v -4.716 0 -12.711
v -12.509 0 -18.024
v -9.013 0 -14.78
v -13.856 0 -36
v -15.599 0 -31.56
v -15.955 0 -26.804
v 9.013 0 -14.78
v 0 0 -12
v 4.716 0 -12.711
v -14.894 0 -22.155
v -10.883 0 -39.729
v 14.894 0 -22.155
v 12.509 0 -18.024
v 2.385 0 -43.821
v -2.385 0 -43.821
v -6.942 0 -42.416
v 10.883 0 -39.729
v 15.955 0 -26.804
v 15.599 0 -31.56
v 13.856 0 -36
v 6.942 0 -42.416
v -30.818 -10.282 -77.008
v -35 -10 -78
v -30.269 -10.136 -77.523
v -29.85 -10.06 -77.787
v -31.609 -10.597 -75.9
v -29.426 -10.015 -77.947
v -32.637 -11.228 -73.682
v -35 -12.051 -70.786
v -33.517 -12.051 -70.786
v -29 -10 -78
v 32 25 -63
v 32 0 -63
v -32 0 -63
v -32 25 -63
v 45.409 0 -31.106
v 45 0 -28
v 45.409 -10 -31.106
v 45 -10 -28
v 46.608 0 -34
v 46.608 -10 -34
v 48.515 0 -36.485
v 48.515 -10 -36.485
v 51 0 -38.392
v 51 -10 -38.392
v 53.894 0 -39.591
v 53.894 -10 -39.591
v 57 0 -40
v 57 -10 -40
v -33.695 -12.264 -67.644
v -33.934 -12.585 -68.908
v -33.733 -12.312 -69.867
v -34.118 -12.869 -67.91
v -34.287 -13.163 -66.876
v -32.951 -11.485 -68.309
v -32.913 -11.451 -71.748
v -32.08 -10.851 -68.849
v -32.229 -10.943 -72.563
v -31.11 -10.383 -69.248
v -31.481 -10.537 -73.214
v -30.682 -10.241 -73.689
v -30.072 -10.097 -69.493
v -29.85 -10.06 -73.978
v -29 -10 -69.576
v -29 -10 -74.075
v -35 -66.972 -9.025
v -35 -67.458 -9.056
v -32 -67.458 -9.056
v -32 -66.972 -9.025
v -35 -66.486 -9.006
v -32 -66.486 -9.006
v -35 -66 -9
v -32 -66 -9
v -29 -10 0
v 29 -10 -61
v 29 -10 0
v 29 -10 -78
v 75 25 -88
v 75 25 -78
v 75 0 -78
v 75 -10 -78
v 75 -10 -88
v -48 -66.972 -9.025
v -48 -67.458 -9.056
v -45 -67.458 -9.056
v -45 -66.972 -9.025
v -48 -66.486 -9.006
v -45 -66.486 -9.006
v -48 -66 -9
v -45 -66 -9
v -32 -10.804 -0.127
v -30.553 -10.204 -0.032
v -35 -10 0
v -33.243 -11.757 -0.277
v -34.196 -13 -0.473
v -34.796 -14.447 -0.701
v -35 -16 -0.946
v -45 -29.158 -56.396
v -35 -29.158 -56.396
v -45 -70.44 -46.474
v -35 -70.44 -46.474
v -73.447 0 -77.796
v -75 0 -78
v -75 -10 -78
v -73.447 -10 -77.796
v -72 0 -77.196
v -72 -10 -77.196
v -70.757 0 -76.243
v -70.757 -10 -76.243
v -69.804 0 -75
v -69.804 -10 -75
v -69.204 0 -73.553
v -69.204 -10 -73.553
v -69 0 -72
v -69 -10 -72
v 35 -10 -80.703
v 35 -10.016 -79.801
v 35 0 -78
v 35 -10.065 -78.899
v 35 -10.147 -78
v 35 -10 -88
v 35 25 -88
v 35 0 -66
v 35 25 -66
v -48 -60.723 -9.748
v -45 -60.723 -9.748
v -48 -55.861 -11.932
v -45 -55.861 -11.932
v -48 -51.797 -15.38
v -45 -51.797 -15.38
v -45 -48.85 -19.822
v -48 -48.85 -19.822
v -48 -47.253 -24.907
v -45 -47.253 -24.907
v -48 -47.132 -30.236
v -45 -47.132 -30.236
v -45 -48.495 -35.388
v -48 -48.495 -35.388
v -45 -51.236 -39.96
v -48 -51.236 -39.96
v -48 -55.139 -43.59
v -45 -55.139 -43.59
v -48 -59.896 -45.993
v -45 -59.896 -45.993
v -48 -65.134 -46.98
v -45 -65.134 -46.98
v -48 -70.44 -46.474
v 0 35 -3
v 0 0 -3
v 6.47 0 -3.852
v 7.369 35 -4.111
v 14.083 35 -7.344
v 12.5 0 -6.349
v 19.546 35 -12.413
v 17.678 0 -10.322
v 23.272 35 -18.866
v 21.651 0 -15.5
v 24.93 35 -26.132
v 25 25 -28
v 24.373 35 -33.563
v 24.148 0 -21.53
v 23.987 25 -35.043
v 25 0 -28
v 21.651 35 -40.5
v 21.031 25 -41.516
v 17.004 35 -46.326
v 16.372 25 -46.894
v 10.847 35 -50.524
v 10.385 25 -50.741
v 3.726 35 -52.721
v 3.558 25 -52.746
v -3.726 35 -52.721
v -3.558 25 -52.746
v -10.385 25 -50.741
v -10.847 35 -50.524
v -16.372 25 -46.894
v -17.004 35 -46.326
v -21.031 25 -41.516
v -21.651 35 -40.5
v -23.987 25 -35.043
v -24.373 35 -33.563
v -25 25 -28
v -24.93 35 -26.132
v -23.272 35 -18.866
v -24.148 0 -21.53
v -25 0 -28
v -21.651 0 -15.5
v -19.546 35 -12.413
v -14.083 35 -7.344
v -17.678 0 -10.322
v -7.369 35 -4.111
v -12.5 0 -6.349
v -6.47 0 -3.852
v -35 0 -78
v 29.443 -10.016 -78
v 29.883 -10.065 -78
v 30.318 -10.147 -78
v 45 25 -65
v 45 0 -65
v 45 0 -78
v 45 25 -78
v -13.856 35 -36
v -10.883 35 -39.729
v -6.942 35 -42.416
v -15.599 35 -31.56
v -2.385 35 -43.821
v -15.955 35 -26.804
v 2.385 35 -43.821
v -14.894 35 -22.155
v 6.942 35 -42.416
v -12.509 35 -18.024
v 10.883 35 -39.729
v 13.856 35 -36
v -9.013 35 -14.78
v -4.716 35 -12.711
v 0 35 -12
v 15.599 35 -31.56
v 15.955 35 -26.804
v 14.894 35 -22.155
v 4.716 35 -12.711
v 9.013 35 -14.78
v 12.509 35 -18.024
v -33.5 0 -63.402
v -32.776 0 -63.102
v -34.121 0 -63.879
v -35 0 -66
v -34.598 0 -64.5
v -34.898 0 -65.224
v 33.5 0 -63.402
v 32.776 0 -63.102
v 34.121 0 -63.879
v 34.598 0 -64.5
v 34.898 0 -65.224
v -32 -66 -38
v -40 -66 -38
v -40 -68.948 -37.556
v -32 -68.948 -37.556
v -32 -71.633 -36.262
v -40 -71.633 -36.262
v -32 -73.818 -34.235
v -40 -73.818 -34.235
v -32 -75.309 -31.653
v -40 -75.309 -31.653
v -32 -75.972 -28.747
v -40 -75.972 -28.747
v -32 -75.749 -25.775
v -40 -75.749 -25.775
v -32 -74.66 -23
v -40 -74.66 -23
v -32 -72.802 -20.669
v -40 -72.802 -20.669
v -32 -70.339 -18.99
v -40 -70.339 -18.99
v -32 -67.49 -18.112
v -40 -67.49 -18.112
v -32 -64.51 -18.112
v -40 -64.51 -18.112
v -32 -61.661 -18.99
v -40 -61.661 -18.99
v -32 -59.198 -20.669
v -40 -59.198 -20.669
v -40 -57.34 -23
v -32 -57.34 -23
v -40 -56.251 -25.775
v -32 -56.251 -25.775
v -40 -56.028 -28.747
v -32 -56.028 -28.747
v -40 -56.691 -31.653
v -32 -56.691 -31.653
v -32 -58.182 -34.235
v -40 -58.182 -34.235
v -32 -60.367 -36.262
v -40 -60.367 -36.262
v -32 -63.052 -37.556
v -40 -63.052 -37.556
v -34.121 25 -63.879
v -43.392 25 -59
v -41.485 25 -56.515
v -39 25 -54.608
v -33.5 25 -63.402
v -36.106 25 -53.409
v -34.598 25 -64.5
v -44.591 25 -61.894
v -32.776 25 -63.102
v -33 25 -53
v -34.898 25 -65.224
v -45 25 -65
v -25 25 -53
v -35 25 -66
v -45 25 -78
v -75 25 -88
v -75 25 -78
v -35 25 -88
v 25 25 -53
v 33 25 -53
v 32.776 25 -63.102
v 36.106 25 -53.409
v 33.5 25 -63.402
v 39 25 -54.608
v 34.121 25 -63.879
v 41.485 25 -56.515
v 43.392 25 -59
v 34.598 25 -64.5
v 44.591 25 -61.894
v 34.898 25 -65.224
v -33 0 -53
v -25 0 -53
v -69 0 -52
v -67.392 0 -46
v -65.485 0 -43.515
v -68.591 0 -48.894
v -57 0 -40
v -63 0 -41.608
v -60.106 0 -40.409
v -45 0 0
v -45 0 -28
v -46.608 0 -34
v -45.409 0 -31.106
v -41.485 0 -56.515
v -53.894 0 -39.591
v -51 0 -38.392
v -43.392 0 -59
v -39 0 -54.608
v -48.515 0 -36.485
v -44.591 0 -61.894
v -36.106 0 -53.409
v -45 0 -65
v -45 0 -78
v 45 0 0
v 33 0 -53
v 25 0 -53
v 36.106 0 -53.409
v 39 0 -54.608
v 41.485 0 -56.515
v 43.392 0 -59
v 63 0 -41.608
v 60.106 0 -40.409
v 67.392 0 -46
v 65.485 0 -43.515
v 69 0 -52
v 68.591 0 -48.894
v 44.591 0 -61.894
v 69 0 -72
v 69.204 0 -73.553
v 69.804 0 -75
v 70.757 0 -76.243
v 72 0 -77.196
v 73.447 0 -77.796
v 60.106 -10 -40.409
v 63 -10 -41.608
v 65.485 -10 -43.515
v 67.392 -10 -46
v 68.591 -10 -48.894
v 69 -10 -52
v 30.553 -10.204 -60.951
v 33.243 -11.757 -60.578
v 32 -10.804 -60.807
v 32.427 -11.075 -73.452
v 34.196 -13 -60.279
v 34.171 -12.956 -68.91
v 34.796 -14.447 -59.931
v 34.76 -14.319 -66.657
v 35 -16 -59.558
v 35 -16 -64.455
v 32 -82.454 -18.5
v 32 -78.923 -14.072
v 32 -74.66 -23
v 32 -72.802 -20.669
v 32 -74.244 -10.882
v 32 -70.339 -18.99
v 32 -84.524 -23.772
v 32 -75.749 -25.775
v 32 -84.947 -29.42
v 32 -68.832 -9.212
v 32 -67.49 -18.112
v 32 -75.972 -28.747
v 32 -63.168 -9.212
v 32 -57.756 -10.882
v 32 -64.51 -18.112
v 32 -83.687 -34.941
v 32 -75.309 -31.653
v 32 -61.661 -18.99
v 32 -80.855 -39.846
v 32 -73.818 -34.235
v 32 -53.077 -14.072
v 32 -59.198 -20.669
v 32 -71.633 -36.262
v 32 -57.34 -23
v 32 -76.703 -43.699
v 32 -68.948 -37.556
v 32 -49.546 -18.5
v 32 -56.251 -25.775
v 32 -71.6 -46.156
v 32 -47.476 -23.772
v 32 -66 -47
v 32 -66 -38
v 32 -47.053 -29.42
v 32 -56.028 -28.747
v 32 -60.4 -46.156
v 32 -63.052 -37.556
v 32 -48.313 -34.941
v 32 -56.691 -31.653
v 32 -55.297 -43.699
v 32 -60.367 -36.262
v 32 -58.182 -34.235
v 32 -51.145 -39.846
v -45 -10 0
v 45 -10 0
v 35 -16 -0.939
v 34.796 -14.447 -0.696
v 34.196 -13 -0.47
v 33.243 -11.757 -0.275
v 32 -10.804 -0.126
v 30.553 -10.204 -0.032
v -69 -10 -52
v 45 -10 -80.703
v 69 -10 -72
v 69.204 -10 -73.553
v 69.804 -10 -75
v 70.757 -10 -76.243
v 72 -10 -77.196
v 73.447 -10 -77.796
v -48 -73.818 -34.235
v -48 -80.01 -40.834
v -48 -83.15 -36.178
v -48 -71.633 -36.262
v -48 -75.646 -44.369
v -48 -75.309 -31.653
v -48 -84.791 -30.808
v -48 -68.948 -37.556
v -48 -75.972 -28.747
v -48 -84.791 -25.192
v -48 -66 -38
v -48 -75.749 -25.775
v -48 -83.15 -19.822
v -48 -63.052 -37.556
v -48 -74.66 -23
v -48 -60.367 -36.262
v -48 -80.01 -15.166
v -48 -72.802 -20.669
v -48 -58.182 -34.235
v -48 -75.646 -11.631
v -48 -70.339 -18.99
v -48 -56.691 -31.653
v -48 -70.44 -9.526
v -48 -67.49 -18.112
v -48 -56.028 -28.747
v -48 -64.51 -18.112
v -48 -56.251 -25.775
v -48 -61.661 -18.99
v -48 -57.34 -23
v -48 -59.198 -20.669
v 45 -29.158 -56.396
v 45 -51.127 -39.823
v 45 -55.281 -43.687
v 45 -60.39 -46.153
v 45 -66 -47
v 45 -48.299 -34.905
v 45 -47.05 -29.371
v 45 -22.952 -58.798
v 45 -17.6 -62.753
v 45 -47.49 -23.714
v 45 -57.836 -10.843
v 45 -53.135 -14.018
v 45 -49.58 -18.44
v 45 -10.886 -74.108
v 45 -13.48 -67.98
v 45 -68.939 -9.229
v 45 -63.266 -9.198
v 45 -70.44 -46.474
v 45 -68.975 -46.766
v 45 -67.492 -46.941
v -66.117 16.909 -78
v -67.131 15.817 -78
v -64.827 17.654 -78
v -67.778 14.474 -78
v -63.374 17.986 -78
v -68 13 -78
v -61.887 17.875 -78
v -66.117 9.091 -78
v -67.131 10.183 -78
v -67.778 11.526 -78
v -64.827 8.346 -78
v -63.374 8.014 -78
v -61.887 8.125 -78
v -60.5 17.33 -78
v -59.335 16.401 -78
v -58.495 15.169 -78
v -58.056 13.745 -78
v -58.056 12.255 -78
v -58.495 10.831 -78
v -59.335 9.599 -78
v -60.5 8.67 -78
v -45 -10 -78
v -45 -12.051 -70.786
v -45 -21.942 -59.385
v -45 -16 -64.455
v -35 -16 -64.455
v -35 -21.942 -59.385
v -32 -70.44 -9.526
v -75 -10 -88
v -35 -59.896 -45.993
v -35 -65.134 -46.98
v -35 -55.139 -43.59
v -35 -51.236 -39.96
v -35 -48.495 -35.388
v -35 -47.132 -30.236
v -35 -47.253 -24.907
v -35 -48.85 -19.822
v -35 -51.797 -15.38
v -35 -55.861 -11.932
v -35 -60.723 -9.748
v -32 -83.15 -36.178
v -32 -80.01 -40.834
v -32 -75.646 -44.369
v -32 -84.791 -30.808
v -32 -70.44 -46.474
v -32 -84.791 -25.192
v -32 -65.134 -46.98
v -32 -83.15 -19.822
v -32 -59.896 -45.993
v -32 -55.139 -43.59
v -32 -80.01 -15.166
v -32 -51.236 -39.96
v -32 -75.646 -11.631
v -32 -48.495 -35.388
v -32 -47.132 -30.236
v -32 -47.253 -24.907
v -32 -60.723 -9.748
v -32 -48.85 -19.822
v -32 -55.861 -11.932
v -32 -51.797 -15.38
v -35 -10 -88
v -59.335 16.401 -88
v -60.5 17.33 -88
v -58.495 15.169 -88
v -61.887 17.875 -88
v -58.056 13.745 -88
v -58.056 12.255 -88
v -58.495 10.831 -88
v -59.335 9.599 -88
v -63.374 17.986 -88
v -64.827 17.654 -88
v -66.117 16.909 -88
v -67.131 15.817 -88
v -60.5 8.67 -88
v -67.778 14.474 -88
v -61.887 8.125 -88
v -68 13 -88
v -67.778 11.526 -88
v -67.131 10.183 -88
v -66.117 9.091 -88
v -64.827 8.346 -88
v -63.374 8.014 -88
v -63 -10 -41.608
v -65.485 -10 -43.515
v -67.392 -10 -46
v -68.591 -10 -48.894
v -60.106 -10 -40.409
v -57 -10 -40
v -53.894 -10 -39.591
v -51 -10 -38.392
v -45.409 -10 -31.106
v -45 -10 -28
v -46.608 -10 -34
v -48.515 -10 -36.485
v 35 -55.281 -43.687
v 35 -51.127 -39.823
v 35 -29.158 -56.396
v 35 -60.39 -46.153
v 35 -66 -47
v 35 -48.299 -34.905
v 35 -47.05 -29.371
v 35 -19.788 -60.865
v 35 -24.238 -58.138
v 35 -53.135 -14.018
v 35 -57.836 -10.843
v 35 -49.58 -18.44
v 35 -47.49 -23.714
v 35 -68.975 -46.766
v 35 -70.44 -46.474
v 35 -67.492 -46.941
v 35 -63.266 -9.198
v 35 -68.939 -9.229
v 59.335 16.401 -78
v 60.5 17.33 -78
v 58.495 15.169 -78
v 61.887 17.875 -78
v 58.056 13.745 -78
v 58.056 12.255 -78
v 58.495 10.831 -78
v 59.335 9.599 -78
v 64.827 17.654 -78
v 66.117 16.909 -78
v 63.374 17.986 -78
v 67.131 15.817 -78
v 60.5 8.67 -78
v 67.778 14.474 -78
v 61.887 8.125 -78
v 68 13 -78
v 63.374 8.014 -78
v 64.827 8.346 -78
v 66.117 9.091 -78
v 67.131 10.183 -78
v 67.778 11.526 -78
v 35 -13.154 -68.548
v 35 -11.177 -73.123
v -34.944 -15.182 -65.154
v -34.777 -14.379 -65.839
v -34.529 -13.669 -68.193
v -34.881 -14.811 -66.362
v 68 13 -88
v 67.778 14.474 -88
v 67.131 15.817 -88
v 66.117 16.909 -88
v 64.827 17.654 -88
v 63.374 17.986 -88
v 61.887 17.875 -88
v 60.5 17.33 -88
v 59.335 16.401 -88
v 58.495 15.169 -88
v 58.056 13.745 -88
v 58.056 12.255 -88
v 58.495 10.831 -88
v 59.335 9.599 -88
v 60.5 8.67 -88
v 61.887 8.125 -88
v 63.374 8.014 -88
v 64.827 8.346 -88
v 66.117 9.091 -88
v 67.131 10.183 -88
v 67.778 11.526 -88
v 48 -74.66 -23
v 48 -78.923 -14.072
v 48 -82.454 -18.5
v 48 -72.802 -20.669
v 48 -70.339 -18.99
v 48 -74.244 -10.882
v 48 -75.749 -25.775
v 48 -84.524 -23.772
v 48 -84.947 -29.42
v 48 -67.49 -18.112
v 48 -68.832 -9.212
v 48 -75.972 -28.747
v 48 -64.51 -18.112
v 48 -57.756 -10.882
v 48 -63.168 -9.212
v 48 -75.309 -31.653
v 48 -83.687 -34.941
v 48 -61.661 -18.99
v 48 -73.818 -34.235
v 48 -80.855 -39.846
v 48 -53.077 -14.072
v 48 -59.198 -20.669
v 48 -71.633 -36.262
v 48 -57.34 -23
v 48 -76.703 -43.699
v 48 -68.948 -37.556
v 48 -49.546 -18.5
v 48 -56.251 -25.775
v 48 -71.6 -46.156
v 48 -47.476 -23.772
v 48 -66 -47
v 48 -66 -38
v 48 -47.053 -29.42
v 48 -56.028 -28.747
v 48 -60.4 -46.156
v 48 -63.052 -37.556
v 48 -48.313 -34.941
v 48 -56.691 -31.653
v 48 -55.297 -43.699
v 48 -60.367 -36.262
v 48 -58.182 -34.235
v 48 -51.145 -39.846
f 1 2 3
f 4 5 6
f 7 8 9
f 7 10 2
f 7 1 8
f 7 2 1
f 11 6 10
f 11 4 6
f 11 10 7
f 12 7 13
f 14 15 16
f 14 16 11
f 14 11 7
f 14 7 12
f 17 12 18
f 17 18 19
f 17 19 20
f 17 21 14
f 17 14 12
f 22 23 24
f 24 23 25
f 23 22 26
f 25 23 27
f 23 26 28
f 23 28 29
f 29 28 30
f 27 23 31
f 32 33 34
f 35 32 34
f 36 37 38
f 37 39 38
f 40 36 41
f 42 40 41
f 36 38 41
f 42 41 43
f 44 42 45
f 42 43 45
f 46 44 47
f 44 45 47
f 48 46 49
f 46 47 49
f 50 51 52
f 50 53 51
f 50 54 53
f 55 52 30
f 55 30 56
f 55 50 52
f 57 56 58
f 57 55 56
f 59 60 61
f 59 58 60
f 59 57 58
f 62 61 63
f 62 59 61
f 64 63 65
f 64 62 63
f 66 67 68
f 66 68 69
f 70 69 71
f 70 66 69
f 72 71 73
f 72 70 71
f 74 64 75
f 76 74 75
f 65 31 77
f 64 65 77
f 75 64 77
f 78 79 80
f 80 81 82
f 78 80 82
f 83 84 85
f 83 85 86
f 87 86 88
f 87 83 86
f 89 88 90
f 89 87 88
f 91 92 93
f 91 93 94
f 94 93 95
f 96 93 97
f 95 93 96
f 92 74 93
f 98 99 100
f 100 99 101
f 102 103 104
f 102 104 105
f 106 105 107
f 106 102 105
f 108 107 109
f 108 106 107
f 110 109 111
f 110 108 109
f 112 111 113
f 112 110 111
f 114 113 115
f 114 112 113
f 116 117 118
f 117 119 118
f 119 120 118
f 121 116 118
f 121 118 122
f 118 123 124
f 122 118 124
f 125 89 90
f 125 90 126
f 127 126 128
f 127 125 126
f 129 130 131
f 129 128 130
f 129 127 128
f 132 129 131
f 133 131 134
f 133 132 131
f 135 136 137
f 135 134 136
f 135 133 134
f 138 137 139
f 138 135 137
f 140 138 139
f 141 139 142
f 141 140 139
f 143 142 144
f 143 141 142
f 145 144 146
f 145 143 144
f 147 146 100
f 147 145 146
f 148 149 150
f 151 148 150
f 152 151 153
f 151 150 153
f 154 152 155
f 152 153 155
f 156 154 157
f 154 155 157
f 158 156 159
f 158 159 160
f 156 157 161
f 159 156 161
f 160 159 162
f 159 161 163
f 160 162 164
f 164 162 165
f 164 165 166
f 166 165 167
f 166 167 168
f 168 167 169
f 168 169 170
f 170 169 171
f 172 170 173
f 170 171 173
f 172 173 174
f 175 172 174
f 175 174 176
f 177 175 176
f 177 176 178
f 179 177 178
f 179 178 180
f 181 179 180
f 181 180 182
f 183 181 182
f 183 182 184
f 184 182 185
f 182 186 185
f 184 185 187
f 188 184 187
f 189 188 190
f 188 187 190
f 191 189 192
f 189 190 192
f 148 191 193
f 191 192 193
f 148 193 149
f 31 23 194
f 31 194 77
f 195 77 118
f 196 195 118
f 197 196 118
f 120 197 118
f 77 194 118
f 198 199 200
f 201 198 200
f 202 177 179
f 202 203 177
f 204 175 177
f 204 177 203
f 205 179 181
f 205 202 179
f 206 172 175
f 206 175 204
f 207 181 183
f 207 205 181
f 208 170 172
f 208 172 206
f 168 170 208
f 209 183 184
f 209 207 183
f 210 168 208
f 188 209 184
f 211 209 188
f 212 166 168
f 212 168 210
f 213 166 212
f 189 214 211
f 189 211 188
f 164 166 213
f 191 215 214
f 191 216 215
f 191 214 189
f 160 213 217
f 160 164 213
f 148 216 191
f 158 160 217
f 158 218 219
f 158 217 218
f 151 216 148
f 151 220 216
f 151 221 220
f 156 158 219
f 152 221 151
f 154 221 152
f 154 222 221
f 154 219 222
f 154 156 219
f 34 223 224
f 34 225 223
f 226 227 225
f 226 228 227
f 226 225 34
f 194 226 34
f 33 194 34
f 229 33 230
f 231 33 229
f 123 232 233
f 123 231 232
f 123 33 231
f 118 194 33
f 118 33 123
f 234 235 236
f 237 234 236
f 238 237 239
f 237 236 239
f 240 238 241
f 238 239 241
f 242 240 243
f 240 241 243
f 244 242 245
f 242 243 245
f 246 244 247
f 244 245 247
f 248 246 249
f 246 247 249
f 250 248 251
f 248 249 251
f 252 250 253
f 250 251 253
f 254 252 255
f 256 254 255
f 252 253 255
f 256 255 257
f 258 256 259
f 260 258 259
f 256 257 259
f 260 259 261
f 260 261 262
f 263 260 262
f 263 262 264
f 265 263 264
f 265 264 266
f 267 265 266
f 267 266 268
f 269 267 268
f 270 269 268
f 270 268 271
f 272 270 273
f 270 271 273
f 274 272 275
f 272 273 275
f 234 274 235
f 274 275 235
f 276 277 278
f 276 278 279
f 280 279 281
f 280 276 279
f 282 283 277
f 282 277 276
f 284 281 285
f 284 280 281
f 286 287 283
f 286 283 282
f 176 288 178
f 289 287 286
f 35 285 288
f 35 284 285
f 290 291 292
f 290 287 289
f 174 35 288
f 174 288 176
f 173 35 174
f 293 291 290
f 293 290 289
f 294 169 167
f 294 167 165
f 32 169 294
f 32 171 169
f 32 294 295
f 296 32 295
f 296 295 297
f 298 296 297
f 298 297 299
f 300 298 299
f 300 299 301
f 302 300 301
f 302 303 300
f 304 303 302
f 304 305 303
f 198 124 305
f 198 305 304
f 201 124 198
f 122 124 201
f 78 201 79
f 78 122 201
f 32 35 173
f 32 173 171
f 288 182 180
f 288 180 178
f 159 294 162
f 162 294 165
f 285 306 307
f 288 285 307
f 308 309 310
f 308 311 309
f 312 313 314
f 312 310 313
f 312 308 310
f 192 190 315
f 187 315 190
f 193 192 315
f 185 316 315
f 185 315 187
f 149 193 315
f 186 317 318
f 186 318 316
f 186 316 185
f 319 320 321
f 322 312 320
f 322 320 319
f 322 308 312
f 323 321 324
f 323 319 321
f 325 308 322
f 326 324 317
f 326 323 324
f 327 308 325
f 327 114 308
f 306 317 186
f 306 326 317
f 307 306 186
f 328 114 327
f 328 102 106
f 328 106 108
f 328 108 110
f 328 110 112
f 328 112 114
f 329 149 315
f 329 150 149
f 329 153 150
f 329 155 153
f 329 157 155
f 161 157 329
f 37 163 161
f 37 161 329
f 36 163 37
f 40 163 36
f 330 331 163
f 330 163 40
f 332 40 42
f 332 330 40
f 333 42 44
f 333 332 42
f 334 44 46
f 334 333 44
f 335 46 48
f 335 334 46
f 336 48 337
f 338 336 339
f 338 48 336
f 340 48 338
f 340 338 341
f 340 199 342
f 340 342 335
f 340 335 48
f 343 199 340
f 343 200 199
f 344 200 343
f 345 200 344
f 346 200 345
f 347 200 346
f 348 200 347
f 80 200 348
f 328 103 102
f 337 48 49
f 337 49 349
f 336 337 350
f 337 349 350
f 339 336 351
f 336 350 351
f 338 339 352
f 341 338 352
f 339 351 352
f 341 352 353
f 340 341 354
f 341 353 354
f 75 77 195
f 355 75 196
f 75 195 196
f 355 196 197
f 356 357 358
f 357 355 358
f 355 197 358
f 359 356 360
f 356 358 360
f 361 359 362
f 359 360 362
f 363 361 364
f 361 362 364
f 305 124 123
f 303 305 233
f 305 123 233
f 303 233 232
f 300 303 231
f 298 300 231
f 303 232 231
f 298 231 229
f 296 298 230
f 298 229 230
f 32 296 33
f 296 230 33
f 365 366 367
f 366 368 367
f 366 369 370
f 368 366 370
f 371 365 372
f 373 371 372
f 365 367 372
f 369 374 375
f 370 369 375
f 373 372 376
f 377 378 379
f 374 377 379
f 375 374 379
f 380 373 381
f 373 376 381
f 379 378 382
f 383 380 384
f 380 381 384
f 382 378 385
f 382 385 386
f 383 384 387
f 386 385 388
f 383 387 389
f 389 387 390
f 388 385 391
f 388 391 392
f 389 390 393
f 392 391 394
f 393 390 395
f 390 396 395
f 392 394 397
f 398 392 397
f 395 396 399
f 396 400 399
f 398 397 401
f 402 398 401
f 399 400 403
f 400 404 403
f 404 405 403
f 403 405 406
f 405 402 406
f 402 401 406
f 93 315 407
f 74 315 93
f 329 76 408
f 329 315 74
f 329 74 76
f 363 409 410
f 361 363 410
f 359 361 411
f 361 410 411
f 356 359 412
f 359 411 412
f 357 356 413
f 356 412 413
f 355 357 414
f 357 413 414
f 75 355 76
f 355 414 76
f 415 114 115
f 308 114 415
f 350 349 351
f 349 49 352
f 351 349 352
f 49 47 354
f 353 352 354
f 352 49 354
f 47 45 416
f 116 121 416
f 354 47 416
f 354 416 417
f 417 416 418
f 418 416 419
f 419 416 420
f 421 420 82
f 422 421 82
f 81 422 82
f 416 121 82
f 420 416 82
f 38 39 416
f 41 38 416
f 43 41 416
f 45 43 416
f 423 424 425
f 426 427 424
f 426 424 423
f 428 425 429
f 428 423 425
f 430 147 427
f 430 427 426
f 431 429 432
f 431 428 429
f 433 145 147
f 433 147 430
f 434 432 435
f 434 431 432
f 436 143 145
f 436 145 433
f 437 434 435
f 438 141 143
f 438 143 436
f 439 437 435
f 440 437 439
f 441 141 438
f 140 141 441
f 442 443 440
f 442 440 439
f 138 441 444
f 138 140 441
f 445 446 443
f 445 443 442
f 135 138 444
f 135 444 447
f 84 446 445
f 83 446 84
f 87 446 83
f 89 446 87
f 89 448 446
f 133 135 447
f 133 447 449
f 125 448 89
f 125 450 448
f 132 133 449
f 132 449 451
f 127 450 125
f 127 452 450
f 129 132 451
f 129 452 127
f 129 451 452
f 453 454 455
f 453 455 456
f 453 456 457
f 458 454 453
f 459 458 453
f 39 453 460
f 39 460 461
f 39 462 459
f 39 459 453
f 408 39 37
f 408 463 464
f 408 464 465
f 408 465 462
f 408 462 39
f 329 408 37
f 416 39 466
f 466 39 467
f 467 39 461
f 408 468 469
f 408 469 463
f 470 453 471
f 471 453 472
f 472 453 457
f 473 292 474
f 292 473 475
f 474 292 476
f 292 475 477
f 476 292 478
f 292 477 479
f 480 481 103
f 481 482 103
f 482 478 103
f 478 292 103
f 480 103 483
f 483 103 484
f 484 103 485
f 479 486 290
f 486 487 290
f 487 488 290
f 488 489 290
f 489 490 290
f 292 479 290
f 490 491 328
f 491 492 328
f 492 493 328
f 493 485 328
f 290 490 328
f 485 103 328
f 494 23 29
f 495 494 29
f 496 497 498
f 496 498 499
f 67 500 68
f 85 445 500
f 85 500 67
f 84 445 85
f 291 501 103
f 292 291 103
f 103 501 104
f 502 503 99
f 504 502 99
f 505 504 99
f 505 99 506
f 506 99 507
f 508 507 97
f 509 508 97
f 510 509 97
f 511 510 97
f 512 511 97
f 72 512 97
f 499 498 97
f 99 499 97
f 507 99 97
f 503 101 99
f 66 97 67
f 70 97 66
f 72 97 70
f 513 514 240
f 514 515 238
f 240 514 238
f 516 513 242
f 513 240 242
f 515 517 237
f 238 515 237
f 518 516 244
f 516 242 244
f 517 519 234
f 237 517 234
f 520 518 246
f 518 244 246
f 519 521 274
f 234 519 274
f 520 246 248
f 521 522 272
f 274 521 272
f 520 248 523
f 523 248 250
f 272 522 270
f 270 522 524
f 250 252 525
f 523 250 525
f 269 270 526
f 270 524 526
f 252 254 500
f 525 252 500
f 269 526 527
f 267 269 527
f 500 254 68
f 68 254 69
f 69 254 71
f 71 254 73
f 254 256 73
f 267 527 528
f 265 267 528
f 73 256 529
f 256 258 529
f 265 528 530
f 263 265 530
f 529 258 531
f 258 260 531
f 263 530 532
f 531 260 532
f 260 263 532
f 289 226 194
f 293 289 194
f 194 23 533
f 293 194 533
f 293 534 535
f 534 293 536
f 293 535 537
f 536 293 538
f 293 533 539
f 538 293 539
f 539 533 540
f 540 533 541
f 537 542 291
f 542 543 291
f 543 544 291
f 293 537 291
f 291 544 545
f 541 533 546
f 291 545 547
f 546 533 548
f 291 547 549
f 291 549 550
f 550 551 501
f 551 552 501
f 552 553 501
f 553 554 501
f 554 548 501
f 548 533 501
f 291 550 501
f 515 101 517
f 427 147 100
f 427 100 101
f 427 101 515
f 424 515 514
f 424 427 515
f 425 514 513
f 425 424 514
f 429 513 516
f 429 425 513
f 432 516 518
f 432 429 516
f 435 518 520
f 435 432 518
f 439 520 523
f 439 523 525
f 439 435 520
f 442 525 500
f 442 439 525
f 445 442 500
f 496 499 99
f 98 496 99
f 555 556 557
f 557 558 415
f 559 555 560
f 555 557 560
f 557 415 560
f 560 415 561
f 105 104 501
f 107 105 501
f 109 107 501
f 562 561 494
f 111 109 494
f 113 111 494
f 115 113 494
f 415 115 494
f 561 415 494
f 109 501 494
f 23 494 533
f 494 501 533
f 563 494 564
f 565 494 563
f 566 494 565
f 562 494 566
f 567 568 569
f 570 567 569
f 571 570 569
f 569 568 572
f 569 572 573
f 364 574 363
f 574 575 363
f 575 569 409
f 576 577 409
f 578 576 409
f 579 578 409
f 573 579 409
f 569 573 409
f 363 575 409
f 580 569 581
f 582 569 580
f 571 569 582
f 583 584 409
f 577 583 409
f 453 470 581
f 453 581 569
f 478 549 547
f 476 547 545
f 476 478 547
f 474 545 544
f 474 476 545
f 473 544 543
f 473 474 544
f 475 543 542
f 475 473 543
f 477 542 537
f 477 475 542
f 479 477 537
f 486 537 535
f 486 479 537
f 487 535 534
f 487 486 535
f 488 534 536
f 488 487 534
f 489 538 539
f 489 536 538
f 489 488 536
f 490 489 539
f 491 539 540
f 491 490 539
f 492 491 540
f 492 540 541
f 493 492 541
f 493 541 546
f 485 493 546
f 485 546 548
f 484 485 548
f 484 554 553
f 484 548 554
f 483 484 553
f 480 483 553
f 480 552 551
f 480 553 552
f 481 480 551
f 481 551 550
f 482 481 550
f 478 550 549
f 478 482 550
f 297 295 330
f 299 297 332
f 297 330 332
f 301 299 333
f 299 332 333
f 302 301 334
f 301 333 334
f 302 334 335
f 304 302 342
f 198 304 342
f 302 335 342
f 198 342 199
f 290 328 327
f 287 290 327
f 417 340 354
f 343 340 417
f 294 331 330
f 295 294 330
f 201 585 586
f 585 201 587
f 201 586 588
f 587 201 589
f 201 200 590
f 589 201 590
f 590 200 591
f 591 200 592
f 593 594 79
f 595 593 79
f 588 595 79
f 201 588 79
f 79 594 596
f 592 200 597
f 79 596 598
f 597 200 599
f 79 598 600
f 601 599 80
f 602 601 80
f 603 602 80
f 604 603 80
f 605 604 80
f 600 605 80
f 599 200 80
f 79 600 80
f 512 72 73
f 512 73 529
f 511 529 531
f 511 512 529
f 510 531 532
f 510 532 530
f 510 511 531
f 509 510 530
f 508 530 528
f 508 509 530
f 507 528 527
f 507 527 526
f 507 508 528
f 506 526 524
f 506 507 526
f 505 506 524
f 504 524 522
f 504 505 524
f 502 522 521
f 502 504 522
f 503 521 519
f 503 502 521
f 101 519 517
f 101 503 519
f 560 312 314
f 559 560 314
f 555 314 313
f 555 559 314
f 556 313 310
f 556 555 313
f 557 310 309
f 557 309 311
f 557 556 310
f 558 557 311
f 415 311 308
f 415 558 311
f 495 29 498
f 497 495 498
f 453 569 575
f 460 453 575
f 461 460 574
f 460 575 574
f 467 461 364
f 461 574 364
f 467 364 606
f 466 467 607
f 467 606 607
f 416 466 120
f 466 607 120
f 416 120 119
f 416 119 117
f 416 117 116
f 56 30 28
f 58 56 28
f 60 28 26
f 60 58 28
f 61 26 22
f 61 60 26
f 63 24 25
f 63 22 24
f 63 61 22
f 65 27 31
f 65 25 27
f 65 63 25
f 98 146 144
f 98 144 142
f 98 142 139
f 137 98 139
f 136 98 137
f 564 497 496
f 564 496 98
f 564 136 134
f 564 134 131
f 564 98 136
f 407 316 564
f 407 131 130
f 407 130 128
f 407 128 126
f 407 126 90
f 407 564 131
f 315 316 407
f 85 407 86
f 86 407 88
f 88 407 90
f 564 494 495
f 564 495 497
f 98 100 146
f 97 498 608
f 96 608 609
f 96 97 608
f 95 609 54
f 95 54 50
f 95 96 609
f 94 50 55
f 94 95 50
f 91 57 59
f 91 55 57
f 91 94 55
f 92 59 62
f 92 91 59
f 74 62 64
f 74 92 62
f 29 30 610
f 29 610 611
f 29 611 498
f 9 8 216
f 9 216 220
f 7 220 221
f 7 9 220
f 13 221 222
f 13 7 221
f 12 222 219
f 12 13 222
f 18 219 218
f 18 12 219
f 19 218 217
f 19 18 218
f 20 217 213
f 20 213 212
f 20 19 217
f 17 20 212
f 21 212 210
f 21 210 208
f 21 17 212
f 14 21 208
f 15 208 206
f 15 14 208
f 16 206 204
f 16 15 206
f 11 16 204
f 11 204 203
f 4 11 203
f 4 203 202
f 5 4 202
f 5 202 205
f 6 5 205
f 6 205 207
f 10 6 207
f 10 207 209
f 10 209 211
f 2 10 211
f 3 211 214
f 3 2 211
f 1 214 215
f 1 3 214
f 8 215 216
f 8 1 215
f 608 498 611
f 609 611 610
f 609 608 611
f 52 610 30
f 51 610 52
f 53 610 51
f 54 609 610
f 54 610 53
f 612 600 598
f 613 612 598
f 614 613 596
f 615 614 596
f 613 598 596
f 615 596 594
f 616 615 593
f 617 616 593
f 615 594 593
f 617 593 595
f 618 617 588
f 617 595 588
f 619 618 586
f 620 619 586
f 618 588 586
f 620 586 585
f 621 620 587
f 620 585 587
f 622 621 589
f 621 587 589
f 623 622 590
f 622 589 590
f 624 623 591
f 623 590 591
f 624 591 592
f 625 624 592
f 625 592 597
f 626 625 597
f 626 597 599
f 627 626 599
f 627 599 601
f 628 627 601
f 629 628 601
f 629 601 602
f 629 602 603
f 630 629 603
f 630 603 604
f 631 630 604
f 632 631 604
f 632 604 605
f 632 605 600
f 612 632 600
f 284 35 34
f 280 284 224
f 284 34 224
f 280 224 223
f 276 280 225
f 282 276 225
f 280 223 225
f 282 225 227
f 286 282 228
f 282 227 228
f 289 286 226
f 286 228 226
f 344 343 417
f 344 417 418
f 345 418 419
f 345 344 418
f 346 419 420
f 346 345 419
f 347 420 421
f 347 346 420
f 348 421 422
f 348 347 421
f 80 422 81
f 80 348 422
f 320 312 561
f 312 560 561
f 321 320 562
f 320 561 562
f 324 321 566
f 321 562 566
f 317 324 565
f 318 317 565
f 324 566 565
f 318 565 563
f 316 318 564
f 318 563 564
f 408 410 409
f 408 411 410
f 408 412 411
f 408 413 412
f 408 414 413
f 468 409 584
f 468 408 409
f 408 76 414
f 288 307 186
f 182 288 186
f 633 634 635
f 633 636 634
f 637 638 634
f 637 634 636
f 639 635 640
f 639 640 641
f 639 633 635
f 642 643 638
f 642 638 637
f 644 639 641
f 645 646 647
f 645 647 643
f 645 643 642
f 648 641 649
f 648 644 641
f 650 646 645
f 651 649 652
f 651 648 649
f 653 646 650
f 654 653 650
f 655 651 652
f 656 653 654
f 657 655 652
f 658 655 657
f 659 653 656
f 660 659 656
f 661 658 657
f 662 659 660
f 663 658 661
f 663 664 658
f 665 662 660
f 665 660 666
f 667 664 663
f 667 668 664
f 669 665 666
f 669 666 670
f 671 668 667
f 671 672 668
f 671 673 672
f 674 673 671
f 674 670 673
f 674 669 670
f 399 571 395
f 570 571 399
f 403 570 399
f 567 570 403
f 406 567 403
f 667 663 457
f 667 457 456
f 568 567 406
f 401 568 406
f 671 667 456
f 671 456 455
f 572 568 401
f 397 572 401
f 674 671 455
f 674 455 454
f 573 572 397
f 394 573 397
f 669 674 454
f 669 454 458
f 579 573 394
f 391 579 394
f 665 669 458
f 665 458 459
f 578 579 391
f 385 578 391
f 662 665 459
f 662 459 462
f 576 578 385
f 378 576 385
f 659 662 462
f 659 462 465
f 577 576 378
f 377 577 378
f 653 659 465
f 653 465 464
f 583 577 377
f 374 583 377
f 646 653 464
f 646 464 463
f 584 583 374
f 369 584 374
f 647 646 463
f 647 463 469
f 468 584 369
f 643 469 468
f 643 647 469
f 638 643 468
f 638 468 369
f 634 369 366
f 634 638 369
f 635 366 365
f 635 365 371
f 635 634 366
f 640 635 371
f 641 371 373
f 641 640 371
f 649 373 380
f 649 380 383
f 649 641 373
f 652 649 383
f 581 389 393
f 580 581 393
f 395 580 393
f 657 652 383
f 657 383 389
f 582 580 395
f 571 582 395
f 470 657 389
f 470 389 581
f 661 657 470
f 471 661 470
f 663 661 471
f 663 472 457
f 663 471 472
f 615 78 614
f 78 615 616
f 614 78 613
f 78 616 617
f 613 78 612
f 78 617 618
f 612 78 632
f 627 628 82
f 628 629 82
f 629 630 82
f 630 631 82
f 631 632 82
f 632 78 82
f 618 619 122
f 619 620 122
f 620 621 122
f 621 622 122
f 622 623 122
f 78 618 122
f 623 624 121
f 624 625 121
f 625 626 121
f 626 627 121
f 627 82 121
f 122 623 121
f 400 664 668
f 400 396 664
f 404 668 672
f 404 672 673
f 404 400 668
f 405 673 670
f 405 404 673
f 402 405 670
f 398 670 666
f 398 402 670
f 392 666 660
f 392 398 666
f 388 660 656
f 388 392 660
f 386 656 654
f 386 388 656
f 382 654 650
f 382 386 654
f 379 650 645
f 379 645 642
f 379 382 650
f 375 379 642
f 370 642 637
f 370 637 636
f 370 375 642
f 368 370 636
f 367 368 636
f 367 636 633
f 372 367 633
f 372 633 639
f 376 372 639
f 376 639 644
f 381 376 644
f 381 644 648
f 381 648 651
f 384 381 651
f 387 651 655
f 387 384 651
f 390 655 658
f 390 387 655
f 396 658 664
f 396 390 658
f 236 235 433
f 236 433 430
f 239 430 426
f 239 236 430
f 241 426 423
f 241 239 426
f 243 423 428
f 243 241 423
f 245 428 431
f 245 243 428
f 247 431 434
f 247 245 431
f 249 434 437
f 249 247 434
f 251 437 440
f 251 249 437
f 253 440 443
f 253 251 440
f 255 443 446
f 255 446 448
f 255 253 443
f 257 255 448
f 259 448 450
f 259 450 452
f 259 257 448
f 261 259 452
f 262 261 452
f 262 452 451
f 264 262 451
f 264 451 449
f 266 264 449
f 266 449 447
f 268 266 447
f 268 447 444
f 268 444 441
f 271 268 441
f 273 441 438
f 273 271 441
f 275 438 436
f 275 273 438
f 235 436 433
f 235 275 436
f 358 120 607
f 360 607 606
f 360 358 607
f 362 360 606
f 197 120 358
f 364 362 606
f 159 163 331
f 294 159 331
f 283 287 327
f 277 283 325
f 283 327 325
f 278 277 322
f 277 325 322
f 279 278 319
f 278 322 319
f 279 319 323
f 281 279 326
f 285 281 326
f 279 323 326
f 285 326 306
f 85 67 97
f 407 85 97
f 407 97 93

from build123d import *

# Parameters (mm, degrees)
BOSS_EXTRUDE1_DEPTH = 10
SKETCH2_R           = 25
SKETCH2_R_2         = 16
BOSS_EXTRUDE2_DEPTH = 35
BOSS_EXTRUDE4_START = -45
BOSS_EXTRUDE4_DEPTH = 35
SKETCH4_R           = 5
CUT_EXTRUDE1_DEPTH  = 35
FILLET1_R           = 12
FILLET2_R           = 12
BOSS_EXTRUDE5_START = -5
SKETCH5_R           = 19
SKETCH5_R_2         = 10
BOSS_EXTRUDE5_DEPTH = 8
BOSS_EXTRUDE6_DEPTH = 10
FILLET3_R           = 6
FILLET4_START       = 35
FILLET4_DEPTH       = 10
FILLET4_START_2     = -78
FILLET4_2_DEPTH     = 21.60438079
FILLET4_START_3     = 30.318225383
FILLET4_3_DEPTH     = 4.681774617
BOSS_EXTRUDE7_START = -5
SKETCH7_R           = 10
BOSS_EXTRUDE7_DEPTH = 8
BOSS_EXTRUDE8_START = -10
BOSS_EXTRUDE8_DEPTH = 10
FILLET5_R           = 6


with BuildPart() as part:
    # Sketch1 → Boss-Extrude1 (new body)
    with BuildSketch(Plane(origin=(0, 0, 0), x_dir=(1, 0, 0), z_dir=(0, 1, 0))):
        with BuildLine():
            Line((-45, 0), (45, 0))
            Line((45, 0), (45, 40))
            Line((45, 40), (69, 40))
            Line((69, 40), (69, 72))
            ThreePointArc((69, 72), (70.757359313, 76.242640687), (75, 78))
            Line((75, 78), (-75, 78))
            ThreePointArc((-75, 78), (-70.757359313, 76.242640687), (-69, 72))
            Line((-69, 72), (-69, 40))
            Line((-69, 40), (-45, 40))
            Line((-45, 40), (-45, 0))
        make_face()
    extrude(amount=-BOSS_EXTRUDE1_DEPTH)

    # Sketch2 → Boss-Extrude2 (add)
    with BuildSketch(Plane(origin=(0, 0, 0), x_dir=(1, 0, 0), z_dir=(0, 1, 0))):
        with Locations(Location((0, 28, 0), (0, 0, 270))):
            Circle(SKETCH2_R)
        with Locations(Location((0, 28, 0), (0, 0, 270))):
            Circle(SKETCH2_R_2, mode=Mode.SUBTRACT)
    extrude(amount=BOSS_EXTRUDE2_DEPTH)

    # Sketch3 → Boss-Extrude4 (add)
    with BuildSketch(Plane(origin=(0, 35, 0), x_dir=(1, 0, 0), z_dir=(0, 1, 0)).offset(BOSS_EXTRUDE4_START)):
        with BuildLine():
            Line((32, 63), (-32, 63))
            ThreePointArc((-32, 63), (-34.121320344, 63.878679656), (-35, 66))
            Line((-35, 66), (-35, 88))
            Line((-35, 88), (-75, 88))
            Line((-75, 88), (-75, 78))
            Line((-75, 78), (-45, 78))
            Line((-45, 78), (-45, 65))
            ThreePointArc((-45, 65), (-41.485281374, 56.514718626), (-33, 53))
            Line((-33, 53), (-25, 53))
            Line((-25, 53), (-25, 28))
            ThreePointArc((-25, 28), (0, 53), (25, 28))
            Line((25, 28), (25, 53))
            Line((25, 53), (33, 53))
            ThreePointArc((33, 53), (41.485281374, 56.514718626), (45, 65))
            Line((45, 65), (45, 78))
            Line((45, 78), (75, 78))
            Line((75, 78), (75, 88))
            Line((75, 88), (35, 88))
            Line((35, 88), (35, 66))
            ThreePointArc((35, 66), (34.121320344, 63.878679656), (32, 63))
        make_face()
    extrude(amount=BOSS_EXTRUDE4_DEPTH)

    # Sketch4 → Cut-Extrude1 (cut)
    with BuildSketch(Plane.XY.offset(-78)):
        with Locations((63, 13)):
            Circle(SKETCH4_R)
    cut_extrude1 = extrude(amount=-CUT_EXTRUDE1_DEPTH, mode=Mode.SUBTRACT)

    # Mirror1: Cut-Extrude1 across plane
    add(cut_extrude1.mirror(Plane(origin=(0, 0, 0), x_dir=(0, 0, 1), z_dir=(1, 0, 0))), mode=Mode.SUBTRACT)

    # Fillet1
    fillet1_edges = [part.edges().sort_by_distance(p)[0] for p in [
        (-45, -5, -40),
        (45, -5, -40),
    ]]
    fillet(fillet1_edges, radius=FILLET1_R)

    # Fillet2
    fillet2_edges = [part.edges().sort_by_distance(p)[0] for p in [
        (-69, -5, -40),
        (69, -5, -40),
    ]]
    fillet(fillet2_edges, radius=FILLET2_R - 0.0001)  # a hair under: the kernel refuses the full size



with BuildPart() as body_2:
    # Sketch5 → Boss-Extrude5 (new, symmetric)
    with BuildSketch(Plane(origin=(45, 0, 0), x_dir=(0, 0, -1), z_dir=(1, 0, 0)).offset(BOSS_EXTRUDE5_START)):
        with Locations((28, -66)):
            Circle(SKETCH5_R)
        with Locations((28, -66)):
            Circle(SKETCH5_R_2, mode=Mode.SUBTRACT)
    extrude(amount=BOSS_EXTRUDE5_DEPTH, both=True)


with BuildPart() as part_1:
    add(part.part)

    add(body_2.part)  # Boss-Extrude6 merges body 2
    # Sketch5<3> → Boss-Extrude6 (add)
    with BuildSketch(Plane(origin=(45, 0, 0), x_dir=(0, 0, -1), z_dir=(1, 0, 0))):
        with BuildLine():
            Line((61, -10), (0, -10))
            Line((0, -10), (9.228717941, -68.939212458))
            ThreePointArc((9.228717941, -68.939212458), (26.525951004, -47.057265785), (47, -66))
            ThreePointArc((47, -66), (46.868026287, -68.235527685), (46.473938523, -70.439999487))
            Line((46.473938523, -70.439999487), (61, -10))
        make_face()
    extrude(amount=-BOSS_EXTRUDE6_DEPTH)

    # Fillet3
    fillet3_edges = [part_1.edges().sort_by_distance(p)[0] for p in [
        (35, -10, -30.5),
    ]]
    fillet(fillet3_edges, radius=FILLET3_R)

    # Fillet4: read off the stored shape, not the designer's step
    # Fillet4 outline → Fillet4 (add)
    with BuildSketch(Plane.YZ.offset(FILLET4_START)):
        with BuildLine():
            ThreePointArc((-29.157895412, -56.39561931), (-15.365176157, -65.228495591), (-10, -80.703433157))
            Line((-10, -80.703433157), (-10, -61))
            Line((-10, -61), (-29.157895412, -56.39561931))
        make_face()
    extrude(amount=FILLET4_DEPTH)

    # Fillet4 2 outline → Fillet4 2 (add)
    with BuildSketch(Plane.XY.offset(FILLET4_START_2)):
        with BuildLine():
            ThreePointArc((29, -10), (33.242640687, -11.757359313), (35, -16))
            Line((35, -16), (35, -10))
            Line((35, -10), (29, -10))
        make_face()
    extrude(amount=FILLET4_2_DEPTH)

    # Fillet4 3 outline → Fillet4 3 (cut)
    with BuildSketch(Plane.YZ.offset(FILLET4_START_3)):
        with BuildLine():
            Line((-18, -80), (-10.009898324, -80))
            ThreePointArc((-10.009898324, -80), (-12.047126523, -70.795577731), (-17.3481317, -63))
            Line((-17.3481317, -63), (-18, -63))
            Line((-18, -63), (-18, -80))
        make_face()
    extrude(amount=FILLET4_3_DEPTH, mode=Mode.SUBTRACT)



with BuildPart() as body_2_2:
    # Sketch7 → Boss-Extrude7 (new, symmetric)
    with BuildSketch(Plane.ZY.offset(45).offset(BOSS_EXTRUDE7_START)):
        with BuildLine():
            ThreePointArc((-46.473938523, -70.439999487), (-28, -85), (-9.526061477, -70.439999487))
            Line((-9.526061477, -70.439999487), (-9.055986357, -67.457514009))
            ThreePointArc((-9.055986357, -67.457514009), (-9.014001748, -66.729294447), (-9, -66))
            ThreePointArc((-9, -66), (-30.235527685, -47.131973713), (-46.473938523, -70.439999487))
        make_face()
        with Locations(Location((-28, -66, 0), (0, 0, 180))):
            Circle(SKETCH7_R, mode=Mode.SUBTRACT)
    extrude(amount=BOSS_EXTRUDE7_DEPTH, both=True)


with BuildPart() as part_2:
    add(part_1.part)

    add(body_2_2.part)  # Boss-Extrude8 merges body 2 2
    # Sketch7<3> → Boss-Extrude8 (add)
    with BuildSketch(Plane.ZY.offset(45).offset(BOSS_EXTRUDE8_START)):
        with BuildLine():
            ThreePointArc((-9, -66), (-9.014001748, -66.729294447), (-9.055986357, -67.457514009))
            Line((-9.055986357, -67.457514009), (0, -10))
            Line((0, -10), (-28, -10))
            Line((-28, -10), (-78, -10))
            Line((-78, -10), (-70.785998867, -12.051263714))
            Line((-70.785998867, -12.051263714), (-64.455356347, -16))
            Line((-64.455356347, -16), (-59.38495245, -21.941578182))
            Line((-59.38495245, -21.941578182), (-56.39561931, -29.157895412))
            Line((-56.39561931, -29.157895412), (-46.473938523, -70.439999487))
            ThreePointArc((-46.473938523, -70.439999487), (-30.235527685, -47.131973713), (-9, -66))
        make_face()
    extrude(amount=BOSS_EXTRUDE8_DEPTH)

    # Fillet5
    # the kernel refuses this fillet: 6 mm, written as the material it adds along each edge
    with BuildSketch(Plane(origin=(-35, -10, 0), x_dir=(1, 0, 0), z_dir=(0, 0, -1))) as fillet5_piece_1_section:
        with BuildLine():
            CenterArc((FILLET5_R, FILLET5_R), FILLET5_R, 180, 90)
            Line((0, FILLET5_R), (0, 0))
            Line((0, 0), (FILLET5_R, 0))
        make_face()
    fillet5_piece_1 = extrude(amount=78, mode=Mode.PRIVATE)
    fillet5_piece_1 = split(fillet5_piece_1, bisect_by=Plane(origin=(-35, -10, 0), z_dir=(0, 0.15568994877172856, -0.9878059727757555)), keep=Keep.TOP, mode=Mode.PRIVATE)
    fillet5_piece_1 = split(fillet5_piece_1, bisect_by=Plane(origin=(-35, -30.519826172, -5.834705883), z_dir=(0, 0.9618711340013946, 0.27350305587848817)), keep=Keep.TOP, mode=Mode.PRIVATE)
    fillet5_piece_1 = split(fillet5_piece_1, bisect_by=Plane(origin=(-35, -44.355068521, -40.257803859), z_dir=(0, 0.6491383227373216, 0.7606703871939389)), keep=Keep.TOP, mode=Mode.PRIVATE)
    add(fillet5_piece_1)
    with BuildSketch(Plane(origin=(-35, -10, 0), x_dir=(1, 0, 0), z_dir=(0, 0, -1))) as fillet5_piece_2_section:
        with BuildLine():
            CenterArc((FILLET5_R, FILLET5_R), FILLET5_R, 180, 90)
            Line((0, FILLET5_R), (0, 0))
            Line((0, 0), (FILLET5_R, 0))
        make_face()
    fillet5_piece_2 = extrude(amount=78, mode=Mode.PRIVATE)
    fillet5_piece_2 = split(fillet5_piece_2, bisect_by=Plane(origin=(-35, -30.519826172, -5.834705883), z_dir=(0, -0.9618711340013946, -0.27350305587848817)), keep=Keep.TOP, mode=Mode.PRIVATE)
    fillet5_piece_2 = split(fillet5_piece_2, bisect_by=Plane(origin=(-35, -44.355068521, -40.257803859), z_dir=(0, 0.6491383227373216, 0.7606703871939389)), keep=Keep.TOP, mode=Mode.PRIVATE)
    add(fillet5_piece_2)
    with BuildSketch(Plane(origin=(-35, -10, 0), x_dir=(1, 0, 0), z_dir=(0, 0, -1))) as fillet5_piece_3_section:
        with BuildLine():
            CenterArc((FILLET5_R, FILLET5_R), FILLET5_R, 180, 90)
            Line((0, FILLET5_R), (0, 0))
            Line((0, 0), (FILLET5_R, 0))
        make_face()
    fillet5_piece_3 = extrude(amount=78, mode=Mode.PRIVATE)
    fillet5_piece_3 = split(fillet5_piece_3, bisect_by=Plane(origin=(-35, -30.519826172, -5.834705883), z_dir=(0, 0.9618711340013946, 0.27350305587848817)), keep=Keep.TOP, mode=Mode.PRIVATE)
    fillet5_piece_3 = split(fillet5_piece_3, bisect_by=Plane(origin=(-35, -43.262700092, -20.747598748), z_dir=(0, 0.8484747516990396, 0.5292358602071983)), keep=Keep.TOP, mode=Mode.PRIVATE)
    fillet5_piece_3 = split(fillet5_piece_3, bisect_by=Plane(origin=(-35, -44.355068521, -40.257803859), z_dir=(0, -0.6491383227373216, -0.7606703871939389)), keep=Keep.TOP, mode=Mode.PRIVATE)
    add(fillet5_piece_3)
    with BuildSketch(Plane(origin=(-35, -10, 0), x_dir=(1, 0, 0), z_dir=(0, 0, -1))) as fillet5_piece_4_section:
        with BuildLine():
            CenterArc((FILLET5_R, FILLET5_R), FILLET5_R, 180, 90)
            Line((0, FILLET5_R), (0, 0))
            Line((0, 0), (FILLET5_R, 0))
        make_face()
    fillet5_piece_4 = extrude(amount=78, mode=Mode.PRIVATE)
    fillet5_piece_4 = split(fillet5_piece_4, bisect_by=Plane(origin=(-35, -30.519826172, -5.834705883), z_dir=(0, -0.9618711340013946, -0.27350305587848817)), keep=Keep.TOP, mode=Mode.PRIVATE)
    fillet5_piece_4 = split(fillet5_piece_4, bisect_by=Plane(origin=(-35, -43.262700092, -20.747598748), z_dir=(0, 0.8484747516990396, 0.5292358602071983)), keep=Keep.TOP, mode=Mode.PRIVATE)
    fillet5_piece_4 = split(fillet5_piece_4, bisect_by=Plane(origin=(-35, -44.355068521, -40.257803859), z_dir=(0, -0.6491383227373216, -0.7606703871939389)), keep=Keep.TOP, mode=Mode.PRIVATE)
    add(fillet5_piece_4)
    with BuildSketch(Plane(origin=(-35, -10, 0), x_dir=(1, 0, 0), z_dir=(0, 0, -1))) as fillet5_piece_5_section:
        with BuildLine():
            CenterArc((FILLET5_R, FILLET5_R), FILLET5_R, 180, 90)
            Line((0, FILLET5_R), (0, 0))
            Line((0, 0), (FILLET5_R, 0))
        make_face()
    fillet5_piece_5 = extrude(amount=78, mode=Mode.PRIVATE)
    fillet5_piece_5 = split(fillet5_piece_5, bisect_by=Plane(origin=(-35, -30.519826172, -5.834705883), z_dir=(0, 0.9618711340013946, 0.27350305587848817)), keep=Keep.TOP, mode=Mode.PRIVATE)
    fillet5_piece_5 = split(fillet5_piece_5, bisect_by=Plane(origin=(-35, -43.262700092, -20.747598748), z_dir=(0, -0.8484747516990396, -0.5292358602071983)), keep=Keep.TOP, mode=Mode.PRIVATE)
    add(fillet5_piece_5)


solid = part_2.part
